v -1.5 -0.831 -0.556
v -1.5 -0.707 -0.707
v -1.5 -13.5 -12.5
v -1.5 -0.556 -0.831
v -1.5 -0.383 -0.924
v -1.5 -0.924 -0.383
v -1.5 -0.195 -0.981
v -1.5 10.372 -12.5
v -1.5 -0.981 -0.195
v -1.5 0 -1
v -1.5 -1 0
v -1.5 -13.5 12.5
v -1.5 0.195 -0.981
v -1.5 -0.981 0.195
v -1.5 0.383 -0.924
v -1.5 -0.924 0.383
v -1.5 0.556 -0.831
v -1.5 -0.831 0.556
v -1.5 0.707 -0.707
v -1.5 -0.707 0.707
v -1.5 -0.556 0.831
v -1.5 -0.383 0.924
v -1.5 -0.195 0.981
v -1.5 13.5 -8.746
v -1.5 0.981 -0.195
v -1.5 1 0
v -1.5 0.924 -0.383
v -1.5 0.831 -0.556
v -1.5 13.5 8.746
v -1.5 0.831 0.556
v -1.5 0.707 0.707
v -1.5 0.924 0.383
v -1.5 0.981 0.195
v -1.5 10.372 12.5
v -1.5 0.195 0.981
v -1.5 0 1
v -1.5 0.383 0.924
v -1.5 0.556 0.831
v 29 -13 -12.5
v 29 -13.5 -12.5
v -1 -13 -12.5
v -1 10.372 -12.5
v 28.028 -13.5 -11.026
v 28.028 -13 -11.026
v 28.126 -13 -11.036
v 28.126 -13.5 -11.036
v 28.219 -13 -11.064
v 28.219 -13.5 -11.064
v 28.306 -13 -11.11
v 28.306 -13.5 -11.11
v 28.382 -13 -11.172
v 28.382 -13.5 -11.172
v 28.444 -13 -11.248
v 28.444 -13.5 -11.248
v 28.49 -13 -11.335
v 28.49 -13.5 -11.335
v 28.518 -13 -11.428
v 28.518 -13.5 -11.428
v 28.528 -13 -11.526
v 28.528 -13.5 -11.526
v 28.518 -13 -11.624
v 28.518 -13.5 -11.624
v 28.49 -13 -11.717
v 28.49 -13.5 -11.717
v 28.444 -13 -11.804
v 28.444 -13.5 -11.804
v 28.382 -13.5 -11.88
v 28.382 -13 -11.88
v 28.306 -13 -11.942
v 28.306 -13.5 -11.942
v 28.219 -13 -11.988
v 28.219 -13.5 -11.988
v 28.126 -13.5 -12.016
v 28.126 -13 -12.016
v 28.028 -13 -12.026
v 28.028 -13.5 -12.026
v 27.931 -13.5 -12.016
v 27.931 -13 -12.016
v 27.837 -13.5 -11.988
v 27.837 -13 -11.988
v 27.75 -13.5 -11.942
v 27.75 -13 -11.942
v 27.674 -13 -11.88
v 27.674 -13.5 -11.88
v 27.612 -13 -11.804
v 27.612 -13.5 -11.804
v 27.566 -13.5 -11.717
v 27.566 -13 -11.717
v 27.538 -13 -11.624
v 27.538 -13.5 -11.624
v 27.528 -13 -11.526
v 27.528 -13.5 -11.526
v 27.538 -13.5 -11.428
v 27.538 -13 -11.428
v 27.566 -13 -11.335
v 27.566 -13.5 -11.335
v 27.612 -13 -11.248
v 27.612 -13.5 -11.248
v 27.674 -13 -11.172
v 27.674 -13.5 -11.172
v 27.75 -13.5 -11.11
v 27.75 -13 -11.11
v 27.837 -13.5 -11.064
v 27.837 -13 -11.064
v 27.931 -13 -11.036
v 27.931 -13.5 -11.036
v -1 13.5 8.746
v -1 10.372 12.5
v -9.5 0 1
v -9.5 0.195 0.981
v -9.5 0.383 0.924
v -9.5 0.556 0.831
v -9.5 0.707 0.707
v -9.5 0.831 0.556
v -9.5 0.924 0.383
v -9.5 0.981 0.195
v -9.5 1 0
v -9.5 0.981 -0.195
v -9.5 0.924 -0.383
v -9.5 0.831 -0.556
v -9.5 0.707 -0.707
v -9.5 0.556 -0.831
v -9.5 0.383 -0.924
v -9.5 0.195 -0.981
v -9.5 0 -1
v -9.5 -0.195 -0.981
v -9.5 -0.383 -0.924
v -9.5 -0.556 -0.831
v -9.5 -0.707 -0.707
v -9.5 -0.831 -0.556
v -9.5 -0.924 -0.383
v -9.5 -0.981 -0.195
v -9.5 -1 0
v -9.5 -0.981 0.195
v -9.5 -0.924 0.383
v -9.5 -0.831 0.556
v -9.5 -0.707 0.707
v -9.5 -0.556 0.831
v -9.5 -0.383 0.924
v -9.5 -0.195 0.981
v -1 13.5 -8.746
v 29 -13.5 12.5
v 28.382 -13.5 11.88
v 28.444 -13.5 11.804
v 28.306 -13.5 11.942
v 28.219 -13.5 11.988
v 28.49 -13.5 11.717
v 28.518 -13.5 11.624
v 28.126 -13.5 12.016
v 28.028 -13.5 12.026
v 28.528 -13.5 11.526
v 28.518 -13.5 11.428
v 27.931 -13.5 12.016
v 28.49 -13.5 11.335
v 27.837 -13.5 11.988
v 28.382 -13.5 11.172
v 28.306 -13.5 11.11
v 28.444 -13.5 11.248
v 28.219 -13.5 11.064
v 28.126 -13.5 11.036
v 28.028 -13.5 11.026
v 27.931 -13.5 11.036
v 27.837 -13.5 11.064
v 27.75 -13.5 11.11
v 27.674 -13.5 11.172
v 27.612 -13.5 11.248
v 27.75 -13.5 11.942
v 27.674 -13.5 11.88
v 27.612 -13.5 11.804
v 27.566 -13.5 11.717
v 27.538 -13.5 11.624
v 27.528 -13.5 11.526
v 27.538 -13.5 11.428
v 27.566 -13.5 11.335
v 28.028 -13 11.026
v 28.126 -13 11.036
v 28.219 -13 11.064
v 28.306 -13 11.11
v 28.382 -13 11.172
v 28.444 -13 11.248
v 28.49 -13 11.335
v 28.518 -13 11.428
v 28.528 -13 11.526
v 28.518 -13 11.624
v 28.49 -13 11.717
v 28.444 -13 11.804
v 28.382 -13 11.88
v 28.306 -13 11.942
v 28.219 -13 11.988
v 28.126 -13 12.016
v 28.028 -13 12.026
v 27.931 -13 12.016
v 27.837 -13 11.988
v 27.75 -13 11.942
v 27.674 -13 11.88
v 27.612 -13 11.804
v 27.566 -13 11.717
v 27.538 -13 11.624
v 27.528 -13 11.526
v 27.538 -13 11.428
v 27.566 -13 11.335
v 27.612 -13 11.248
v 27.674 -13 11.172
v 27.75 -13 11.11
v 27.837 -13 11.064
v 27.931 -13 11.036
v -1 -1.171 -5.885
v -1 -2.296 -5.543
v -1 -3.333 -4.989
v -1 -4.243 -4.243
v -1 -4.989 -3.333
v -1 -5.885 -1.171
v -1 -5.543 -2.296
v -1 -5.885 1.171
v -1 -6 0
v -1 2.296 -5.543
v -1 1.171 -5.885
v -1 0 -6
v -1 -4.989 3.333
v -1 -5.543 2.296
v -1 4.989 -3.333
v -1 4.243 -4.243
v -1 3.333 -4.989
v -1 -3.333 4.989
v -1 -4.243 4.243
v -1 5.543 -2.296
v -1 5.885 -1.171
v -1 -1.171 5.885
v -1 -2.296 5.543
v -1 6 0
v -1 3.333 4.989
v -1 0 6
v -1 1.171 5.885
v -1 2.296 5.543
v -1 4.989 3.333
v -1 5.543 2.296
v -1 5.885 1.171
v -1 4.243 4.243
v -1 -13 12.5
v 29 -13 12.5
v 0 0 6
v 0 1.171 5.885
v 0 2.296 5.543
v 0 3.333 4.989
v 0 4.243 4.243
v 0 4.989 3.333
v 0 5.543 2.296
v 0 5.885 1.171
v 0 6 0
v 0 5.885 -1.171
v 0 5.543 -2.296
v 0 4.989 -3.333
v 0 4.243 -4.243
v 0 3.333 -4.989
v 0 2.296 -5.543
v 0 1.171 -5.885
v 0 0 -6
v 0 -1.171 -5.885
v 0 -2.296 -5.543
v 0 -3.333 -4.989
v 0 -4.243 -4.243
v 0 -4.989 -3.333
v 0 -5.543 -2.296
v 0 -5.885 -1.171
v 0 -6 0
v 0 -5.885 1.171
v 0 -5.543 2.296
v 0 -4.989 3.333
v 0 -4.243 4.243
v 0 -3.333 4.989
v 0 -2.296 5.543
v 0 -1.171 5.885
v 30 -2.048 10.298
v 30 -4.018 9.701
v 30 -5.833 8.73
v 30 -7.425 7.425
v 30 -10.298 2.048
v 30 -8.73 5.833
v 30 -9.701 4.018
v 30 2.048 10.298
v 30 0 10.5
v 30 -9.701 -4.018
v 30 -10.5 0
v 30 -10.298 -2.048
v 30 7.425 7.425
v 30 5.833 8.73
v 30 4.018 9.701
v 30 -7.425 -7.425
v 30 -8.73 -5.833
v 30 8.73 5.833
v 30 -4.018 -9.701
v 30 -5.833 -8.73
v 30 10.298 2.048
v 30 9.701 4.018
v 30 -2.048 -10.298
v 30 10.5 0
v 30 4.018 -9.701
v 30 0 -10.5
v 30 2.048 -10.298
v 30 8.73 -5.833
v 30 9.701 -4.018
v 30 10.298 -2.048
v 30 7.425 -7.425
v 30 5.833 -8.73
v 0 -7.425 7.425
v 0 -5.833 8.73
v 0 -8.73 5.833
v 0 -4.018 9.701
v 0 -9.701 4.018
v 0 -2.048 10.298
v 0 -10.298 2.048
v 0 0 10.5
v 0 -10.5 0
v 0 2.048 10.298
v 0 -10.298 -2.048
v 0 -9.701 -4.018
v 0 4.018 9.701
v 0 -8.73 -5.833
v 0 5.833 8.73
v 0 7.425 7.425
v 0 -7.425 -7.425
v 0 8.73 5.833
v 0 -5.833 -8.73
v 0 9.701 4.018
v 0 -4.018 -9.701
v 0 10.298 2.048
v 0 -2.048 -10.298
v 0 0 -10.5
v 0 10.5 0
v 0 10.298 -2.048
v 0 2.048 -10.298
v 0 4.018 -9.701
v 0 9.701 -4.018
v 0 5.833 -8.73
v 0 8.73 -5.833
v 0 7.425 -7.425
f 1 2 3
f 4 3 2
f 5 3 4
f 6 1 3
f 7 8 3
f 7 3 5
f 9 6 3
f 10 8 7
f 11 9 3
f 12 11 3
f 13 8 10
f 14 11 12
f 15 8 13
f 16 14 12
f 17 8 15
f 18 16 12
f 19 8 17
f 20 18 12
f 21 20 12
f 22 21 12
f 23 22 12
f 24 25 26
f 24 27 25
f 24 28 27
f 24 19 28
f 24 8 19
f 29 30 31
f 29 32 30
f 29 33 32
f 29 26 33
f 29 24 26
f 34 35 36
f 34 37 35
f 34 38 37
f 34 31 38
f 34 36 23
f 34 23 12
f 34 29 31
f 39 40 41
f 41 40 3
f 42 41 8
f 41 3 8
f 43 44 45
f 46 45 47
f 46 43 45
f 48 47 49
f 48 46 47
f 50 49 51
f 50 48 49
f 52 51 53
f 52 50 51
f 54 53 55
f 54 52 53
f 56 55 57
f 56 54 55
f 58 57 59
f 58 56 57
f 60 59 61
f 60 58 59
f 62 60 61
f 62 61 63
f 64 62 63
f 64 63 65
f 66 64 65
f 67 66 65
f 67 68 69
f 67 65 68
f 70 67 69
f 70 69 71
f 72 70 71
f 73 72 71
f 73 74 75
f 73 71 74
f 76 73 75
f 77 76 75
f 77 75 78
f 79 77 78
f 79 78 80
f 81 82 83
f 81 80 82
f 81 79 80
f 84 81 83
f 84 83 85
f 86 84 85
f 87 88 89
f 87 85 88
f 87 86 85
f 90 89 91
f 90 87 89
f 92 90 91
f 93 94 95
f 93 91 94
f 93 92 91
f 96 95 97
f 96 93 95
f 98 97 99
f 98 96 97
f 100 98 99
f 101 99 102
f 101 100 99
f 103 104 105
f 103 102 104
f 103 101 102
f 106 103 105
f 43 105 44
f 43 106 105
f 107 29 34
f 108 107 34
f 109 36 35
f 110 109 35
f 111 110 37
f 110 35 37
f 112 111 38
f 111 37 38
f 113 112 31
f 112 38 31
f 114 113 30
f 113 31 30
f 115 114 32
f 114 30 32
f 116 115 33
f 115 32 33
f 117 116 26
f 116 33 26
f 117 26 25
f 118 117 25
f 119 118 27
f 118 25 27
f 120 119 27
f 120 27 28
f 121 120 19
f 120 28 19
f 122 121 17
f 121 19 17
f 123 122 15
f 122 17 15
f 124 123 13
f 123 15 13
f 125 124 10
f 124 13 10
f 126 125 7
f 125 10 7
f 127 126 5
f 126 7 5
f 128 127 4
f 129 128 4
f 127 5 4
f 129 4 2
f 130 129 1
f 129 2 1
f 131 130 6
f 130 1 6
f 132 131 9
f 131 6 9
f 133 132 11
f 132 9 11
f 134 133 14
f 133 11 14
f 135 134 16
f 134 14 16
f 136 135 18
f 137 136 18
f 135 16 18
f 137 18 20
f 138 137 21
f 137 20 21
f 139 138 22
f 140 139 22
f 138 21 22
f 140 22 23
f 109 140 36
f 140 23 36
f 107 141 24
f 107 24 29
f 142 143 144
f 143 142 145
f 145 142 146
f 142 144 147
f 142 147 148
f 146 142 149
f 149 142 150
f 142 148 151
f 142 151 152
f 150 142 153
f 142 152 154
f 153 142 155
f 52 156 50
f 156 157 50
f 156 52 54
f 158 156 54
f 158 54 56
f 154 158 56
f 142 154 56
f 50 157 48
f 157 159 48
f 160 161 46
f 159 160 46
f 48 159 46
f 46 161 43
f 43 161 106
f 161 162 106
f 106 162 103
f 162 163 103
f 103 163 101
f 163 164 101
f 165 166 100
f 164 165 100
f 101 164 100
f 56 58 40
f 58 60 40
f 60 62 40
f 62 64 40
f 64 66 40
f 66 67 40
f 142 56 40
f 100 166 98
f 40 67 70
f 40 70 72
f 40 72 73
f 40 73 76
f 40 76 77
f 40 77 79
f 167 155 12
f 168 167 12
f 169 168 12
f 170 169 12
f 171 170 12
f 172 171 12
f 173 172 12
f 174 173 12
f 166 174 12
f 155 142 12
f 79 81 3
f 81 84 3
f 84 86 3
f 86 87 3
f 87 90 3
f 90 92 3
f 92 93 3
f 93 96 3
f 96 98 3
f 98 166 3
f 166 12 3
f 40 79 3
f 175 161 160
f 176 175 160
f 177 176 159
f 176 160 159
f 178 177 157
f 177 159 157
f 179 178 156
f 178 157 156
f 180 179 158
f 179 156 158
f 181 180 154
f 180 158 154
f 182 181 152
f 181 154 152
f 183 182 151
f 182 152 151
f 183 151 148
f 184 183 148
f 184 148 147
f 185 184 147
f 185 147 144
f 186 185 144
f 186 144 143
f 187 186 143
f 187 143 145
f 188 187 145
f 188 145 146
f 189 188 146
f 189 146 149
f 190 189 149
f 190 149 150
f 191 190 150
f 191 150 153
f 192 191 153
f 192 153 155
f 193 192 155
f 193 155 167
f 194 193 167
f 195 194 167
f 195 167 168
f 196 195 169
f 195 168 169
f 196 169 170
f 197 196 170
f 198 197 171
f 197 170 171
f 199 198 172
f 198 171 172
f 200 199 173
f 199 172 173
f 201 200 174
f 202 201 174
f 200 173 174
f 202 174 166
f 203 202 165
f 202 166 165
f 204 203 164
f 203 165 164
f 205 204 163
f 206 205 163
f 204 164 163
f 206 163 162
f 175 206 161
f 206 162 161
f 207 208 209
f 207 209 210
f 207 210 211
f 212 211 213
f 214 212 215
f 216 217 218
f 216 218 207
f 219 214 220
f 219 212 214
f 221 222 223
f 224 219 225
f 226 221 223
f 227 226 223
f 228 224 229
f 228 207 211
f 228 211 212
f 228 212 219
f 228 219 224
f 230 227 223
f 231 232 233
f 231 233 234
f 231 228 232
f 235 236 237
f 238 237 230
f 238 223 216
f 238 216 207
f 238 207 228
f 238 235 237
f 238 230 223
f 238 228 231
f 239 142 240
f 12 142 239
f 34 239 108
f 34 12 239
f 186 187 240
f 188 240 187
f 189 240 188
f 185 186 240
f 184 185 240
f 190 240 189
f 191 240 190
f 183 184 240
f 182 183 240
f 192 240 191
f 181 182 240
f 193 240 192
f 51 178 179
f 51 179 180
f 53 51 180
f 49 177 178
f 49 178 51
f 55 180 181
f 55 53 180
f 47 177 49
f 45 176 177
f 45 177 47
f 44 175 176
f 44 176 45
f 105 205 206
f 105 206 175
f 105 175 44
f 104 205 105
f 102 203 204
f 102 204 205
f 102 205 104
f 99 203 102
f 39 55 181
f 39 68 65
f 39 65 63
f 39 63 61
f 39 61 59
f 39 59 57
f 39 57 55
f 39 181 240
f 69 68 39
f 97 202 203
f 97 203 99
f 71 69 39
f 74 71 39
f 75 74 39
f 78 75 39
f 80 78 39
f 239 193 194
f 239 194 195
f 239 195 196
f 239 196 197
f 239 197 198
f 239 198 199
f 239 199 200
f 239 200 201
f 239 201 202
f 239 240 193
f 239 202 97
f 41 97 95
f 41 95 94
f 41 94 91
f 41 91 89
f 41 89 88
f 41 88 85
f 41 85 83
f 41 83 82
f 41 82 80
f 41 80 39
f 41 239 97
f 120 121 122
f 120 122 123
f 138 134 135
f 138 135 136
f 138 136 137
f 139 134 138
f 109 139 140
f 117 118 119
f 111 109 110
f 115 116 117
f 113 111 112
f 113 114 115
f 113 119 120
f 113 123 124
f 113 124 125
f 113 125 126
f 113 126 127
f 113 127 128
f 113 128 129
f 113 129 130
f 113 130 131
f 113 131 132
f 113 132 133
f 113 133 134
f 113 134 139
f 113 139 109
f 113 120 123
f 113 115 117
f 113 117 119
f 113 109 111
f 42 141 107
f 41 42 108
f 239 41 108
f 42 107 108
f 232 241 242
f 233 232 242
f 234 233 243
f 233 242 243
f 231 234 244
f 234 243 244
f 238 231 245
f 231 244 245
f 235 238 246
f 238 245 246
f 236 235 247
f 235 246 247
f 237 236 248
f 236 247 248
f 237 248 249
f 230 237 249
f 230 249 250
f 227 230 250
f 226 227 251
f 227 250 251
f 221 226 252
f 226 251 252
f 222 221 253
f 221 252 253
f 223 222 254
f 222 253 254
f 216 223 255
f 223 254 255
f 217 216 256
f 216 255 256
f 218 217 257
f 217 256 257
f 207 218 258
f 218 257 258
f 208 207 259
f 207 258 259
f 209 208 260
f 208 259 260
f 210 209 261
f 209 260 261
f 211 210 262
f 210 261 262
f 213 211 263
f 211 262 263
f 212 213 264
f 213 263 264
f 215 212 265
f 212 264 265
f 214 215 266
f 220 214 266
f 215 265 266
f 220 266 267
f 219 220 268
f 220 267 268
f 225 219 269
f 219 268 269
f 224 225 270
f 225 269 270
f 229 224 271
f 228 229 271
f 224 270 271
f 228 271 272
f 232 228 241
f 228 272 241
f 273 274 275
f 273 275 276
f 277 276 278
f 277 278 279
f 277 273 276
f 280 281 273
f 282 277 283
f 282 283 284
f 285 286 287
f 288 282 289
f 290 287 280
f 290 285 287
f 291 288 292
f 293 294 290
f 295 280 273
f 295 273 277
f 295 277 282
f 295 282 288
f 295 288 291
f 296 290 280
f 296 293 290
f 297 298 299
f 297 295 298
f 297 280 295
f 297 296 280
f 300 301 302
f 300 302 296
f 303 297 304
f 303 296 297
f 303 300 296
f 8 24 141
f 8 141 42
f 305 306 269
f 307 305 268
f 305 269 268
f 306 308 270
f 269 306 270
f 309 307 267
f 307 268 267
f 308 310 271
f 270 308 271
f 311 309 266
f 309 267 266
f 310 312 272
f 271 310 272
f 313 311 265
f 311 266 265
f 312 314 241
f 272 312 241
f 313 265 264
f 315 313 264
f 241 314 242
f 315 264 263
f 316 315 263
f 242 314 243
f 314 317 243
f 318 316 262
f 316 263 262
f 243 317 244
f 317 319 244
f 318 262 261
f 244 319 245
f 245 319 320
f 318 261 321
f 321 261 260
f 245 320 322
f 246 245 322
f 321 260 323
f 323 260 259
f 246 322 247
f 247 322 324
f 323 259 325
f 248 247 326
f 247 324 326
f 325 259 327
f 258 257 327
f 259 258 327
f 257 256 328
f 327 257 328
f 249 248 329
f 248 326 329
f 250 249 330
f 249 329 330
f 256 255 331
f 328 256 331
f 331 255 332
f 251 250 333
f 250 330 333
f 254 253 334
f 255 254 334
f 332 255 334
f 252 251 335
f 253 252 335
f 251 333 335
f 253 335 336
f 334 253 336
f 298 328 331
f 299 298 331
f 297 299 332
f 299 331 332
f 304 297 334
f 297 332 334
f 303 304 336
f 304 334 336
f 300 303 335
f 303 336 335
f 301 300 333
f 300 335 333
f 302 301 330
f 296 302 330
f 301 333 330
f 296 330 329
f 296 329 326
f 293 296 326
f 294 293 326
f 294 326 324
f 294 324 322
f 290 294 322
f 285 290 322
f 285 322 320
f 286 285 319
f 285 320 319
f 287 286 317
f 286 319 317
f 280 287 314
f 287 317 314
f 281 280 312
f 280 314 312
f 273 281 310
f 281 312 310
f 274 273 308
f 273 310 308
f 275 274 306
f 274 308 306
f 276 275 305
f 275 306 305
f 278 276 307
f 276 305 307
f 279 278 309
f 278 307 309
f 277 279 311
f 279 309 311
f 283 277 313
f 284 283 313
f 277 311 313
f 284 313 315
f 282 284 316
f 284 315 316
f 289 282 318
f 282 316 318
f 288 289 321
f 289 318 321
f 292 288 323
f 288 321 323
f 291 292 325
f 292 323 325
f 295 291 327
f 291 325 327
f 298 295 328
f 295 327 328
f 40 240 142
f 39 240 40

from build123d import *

# Parameters (mm, degrees)
ESQUISSE1_R             = 10.5
BOSS_EXTRU_1_DEPTH      = 30
ESQUISSE2_R             = 6
BOSS_EXTRU_2_DEPTH      = 1
ESQUISSE3_W             = 25
ESQUISSE3_H             = 27
BOSS_EXTRU_3_DEPTH      = 0.5
ESQUISSE4_W             = 25
ESQUISSE4_H             = 0.5
BOSS_EXTRU_4_DEPTH      = 30
ESQUISSE5_R             = 0.5
ENL_V_MAT_EXTRU_1_DEPTH = 30
ENL_V_MAT_EXTRU_2_DEPTH = 30
ESQUISSE7_R             = 1
BOSS_EXTRU_5_DEPTH      = 8


with BuildPart() as part:
    # Esquisse1 → Boss.-Extru.1 (new body)
    with BuildSketch(Plane(origin=(0, 0, 0), x_dir=(0, 0, -1), z_dir=(1, 0, 0))):
        Circle(ESQUISSE1_R)
    extrude(amount=BOSS_EXTRU_1_DEPTH)

    # Esquisse2 → Boss.-Extru.2 (add)
    with BuildSketch(Plane.ZY):
        Circle(ESQUISSE2_R)
    extrude(amount=BOSS_EXTRU_2_DEPTH)


with BuildPart() as body_2:
    # Esquisse3 → Boss.-Extru.3 (new body)
    with BuildSketch(Plane.ZY.offset(1)):
        Rectangle(ESQUISSE3_W, ESQUISSE3_H)
    extrude(amount=BOSS_EXTRU_3_DEPTH)

    # Esquisse4 → Boss.-Extru.4 (add)
    with BuildSketch(Plane(origin=(-1, 0, 0), x_dir=(0, 0, -1), z_dir=(1, 0, 0))):
        with Locations((0, -13.25)):
            Rectangle(ESQUISSE4_W, ESQUISSE4_H)
    extrude(amount=BOSS_EXTRU_4_DEPTH)

    # Esquisse5 → Enlèv. mat.-Extru.1 (cut)
    with BuildSketch(Plane.XZ.offset(13.5)):
        with Locations(Location((28.028049864, 11.525997246, 0), (0, 0, 270))):
            Circle(ESQUISSE5_R)
    enl_v_mat_extru_1 = extrude(amount=-ENL_V_MAT_EXTRU_1_DEPTH, mode=Mode.SUBTRACT)

    # Symétrie1: Enlèv. mat.-Extru.1 across plane
    add(enl_v_mat_extru_1.mirror(Plane.XY), mode=Mode.SUBTRACT)

    # Esquisse6 → Enlèv. mat.-Extru.2 (cut)
    with BuildSketch(Plane.ZY.offset(1.5)):
        Polygon((8.746033001, 13.5), (12.5, 10.372361451), (12.5, 13.5), align=None)
    enl_v_mat_extru_2 = extrude(amount=-ENL_V_MAT_EXTRU_2_DEPTH, mode=Mode.SUBTRACT)

    # Symétrie2: Enlèv. mat.-Extru.2 across plane
    add(enl_v_mat_extru_2.mirror(Plane.XY), mode=Mode.SUBTRACT)

    # Esquisse7 → Boss.-Extru.5 (add)
    with BuildSketch(Plane.ZY.offset(1.5)):
        Circle(ESQUISSE7_R)
    extrude(amount=BOSS_EXTRU_5_DEPTH)


solid = Compound([part.part, body_2.part])
